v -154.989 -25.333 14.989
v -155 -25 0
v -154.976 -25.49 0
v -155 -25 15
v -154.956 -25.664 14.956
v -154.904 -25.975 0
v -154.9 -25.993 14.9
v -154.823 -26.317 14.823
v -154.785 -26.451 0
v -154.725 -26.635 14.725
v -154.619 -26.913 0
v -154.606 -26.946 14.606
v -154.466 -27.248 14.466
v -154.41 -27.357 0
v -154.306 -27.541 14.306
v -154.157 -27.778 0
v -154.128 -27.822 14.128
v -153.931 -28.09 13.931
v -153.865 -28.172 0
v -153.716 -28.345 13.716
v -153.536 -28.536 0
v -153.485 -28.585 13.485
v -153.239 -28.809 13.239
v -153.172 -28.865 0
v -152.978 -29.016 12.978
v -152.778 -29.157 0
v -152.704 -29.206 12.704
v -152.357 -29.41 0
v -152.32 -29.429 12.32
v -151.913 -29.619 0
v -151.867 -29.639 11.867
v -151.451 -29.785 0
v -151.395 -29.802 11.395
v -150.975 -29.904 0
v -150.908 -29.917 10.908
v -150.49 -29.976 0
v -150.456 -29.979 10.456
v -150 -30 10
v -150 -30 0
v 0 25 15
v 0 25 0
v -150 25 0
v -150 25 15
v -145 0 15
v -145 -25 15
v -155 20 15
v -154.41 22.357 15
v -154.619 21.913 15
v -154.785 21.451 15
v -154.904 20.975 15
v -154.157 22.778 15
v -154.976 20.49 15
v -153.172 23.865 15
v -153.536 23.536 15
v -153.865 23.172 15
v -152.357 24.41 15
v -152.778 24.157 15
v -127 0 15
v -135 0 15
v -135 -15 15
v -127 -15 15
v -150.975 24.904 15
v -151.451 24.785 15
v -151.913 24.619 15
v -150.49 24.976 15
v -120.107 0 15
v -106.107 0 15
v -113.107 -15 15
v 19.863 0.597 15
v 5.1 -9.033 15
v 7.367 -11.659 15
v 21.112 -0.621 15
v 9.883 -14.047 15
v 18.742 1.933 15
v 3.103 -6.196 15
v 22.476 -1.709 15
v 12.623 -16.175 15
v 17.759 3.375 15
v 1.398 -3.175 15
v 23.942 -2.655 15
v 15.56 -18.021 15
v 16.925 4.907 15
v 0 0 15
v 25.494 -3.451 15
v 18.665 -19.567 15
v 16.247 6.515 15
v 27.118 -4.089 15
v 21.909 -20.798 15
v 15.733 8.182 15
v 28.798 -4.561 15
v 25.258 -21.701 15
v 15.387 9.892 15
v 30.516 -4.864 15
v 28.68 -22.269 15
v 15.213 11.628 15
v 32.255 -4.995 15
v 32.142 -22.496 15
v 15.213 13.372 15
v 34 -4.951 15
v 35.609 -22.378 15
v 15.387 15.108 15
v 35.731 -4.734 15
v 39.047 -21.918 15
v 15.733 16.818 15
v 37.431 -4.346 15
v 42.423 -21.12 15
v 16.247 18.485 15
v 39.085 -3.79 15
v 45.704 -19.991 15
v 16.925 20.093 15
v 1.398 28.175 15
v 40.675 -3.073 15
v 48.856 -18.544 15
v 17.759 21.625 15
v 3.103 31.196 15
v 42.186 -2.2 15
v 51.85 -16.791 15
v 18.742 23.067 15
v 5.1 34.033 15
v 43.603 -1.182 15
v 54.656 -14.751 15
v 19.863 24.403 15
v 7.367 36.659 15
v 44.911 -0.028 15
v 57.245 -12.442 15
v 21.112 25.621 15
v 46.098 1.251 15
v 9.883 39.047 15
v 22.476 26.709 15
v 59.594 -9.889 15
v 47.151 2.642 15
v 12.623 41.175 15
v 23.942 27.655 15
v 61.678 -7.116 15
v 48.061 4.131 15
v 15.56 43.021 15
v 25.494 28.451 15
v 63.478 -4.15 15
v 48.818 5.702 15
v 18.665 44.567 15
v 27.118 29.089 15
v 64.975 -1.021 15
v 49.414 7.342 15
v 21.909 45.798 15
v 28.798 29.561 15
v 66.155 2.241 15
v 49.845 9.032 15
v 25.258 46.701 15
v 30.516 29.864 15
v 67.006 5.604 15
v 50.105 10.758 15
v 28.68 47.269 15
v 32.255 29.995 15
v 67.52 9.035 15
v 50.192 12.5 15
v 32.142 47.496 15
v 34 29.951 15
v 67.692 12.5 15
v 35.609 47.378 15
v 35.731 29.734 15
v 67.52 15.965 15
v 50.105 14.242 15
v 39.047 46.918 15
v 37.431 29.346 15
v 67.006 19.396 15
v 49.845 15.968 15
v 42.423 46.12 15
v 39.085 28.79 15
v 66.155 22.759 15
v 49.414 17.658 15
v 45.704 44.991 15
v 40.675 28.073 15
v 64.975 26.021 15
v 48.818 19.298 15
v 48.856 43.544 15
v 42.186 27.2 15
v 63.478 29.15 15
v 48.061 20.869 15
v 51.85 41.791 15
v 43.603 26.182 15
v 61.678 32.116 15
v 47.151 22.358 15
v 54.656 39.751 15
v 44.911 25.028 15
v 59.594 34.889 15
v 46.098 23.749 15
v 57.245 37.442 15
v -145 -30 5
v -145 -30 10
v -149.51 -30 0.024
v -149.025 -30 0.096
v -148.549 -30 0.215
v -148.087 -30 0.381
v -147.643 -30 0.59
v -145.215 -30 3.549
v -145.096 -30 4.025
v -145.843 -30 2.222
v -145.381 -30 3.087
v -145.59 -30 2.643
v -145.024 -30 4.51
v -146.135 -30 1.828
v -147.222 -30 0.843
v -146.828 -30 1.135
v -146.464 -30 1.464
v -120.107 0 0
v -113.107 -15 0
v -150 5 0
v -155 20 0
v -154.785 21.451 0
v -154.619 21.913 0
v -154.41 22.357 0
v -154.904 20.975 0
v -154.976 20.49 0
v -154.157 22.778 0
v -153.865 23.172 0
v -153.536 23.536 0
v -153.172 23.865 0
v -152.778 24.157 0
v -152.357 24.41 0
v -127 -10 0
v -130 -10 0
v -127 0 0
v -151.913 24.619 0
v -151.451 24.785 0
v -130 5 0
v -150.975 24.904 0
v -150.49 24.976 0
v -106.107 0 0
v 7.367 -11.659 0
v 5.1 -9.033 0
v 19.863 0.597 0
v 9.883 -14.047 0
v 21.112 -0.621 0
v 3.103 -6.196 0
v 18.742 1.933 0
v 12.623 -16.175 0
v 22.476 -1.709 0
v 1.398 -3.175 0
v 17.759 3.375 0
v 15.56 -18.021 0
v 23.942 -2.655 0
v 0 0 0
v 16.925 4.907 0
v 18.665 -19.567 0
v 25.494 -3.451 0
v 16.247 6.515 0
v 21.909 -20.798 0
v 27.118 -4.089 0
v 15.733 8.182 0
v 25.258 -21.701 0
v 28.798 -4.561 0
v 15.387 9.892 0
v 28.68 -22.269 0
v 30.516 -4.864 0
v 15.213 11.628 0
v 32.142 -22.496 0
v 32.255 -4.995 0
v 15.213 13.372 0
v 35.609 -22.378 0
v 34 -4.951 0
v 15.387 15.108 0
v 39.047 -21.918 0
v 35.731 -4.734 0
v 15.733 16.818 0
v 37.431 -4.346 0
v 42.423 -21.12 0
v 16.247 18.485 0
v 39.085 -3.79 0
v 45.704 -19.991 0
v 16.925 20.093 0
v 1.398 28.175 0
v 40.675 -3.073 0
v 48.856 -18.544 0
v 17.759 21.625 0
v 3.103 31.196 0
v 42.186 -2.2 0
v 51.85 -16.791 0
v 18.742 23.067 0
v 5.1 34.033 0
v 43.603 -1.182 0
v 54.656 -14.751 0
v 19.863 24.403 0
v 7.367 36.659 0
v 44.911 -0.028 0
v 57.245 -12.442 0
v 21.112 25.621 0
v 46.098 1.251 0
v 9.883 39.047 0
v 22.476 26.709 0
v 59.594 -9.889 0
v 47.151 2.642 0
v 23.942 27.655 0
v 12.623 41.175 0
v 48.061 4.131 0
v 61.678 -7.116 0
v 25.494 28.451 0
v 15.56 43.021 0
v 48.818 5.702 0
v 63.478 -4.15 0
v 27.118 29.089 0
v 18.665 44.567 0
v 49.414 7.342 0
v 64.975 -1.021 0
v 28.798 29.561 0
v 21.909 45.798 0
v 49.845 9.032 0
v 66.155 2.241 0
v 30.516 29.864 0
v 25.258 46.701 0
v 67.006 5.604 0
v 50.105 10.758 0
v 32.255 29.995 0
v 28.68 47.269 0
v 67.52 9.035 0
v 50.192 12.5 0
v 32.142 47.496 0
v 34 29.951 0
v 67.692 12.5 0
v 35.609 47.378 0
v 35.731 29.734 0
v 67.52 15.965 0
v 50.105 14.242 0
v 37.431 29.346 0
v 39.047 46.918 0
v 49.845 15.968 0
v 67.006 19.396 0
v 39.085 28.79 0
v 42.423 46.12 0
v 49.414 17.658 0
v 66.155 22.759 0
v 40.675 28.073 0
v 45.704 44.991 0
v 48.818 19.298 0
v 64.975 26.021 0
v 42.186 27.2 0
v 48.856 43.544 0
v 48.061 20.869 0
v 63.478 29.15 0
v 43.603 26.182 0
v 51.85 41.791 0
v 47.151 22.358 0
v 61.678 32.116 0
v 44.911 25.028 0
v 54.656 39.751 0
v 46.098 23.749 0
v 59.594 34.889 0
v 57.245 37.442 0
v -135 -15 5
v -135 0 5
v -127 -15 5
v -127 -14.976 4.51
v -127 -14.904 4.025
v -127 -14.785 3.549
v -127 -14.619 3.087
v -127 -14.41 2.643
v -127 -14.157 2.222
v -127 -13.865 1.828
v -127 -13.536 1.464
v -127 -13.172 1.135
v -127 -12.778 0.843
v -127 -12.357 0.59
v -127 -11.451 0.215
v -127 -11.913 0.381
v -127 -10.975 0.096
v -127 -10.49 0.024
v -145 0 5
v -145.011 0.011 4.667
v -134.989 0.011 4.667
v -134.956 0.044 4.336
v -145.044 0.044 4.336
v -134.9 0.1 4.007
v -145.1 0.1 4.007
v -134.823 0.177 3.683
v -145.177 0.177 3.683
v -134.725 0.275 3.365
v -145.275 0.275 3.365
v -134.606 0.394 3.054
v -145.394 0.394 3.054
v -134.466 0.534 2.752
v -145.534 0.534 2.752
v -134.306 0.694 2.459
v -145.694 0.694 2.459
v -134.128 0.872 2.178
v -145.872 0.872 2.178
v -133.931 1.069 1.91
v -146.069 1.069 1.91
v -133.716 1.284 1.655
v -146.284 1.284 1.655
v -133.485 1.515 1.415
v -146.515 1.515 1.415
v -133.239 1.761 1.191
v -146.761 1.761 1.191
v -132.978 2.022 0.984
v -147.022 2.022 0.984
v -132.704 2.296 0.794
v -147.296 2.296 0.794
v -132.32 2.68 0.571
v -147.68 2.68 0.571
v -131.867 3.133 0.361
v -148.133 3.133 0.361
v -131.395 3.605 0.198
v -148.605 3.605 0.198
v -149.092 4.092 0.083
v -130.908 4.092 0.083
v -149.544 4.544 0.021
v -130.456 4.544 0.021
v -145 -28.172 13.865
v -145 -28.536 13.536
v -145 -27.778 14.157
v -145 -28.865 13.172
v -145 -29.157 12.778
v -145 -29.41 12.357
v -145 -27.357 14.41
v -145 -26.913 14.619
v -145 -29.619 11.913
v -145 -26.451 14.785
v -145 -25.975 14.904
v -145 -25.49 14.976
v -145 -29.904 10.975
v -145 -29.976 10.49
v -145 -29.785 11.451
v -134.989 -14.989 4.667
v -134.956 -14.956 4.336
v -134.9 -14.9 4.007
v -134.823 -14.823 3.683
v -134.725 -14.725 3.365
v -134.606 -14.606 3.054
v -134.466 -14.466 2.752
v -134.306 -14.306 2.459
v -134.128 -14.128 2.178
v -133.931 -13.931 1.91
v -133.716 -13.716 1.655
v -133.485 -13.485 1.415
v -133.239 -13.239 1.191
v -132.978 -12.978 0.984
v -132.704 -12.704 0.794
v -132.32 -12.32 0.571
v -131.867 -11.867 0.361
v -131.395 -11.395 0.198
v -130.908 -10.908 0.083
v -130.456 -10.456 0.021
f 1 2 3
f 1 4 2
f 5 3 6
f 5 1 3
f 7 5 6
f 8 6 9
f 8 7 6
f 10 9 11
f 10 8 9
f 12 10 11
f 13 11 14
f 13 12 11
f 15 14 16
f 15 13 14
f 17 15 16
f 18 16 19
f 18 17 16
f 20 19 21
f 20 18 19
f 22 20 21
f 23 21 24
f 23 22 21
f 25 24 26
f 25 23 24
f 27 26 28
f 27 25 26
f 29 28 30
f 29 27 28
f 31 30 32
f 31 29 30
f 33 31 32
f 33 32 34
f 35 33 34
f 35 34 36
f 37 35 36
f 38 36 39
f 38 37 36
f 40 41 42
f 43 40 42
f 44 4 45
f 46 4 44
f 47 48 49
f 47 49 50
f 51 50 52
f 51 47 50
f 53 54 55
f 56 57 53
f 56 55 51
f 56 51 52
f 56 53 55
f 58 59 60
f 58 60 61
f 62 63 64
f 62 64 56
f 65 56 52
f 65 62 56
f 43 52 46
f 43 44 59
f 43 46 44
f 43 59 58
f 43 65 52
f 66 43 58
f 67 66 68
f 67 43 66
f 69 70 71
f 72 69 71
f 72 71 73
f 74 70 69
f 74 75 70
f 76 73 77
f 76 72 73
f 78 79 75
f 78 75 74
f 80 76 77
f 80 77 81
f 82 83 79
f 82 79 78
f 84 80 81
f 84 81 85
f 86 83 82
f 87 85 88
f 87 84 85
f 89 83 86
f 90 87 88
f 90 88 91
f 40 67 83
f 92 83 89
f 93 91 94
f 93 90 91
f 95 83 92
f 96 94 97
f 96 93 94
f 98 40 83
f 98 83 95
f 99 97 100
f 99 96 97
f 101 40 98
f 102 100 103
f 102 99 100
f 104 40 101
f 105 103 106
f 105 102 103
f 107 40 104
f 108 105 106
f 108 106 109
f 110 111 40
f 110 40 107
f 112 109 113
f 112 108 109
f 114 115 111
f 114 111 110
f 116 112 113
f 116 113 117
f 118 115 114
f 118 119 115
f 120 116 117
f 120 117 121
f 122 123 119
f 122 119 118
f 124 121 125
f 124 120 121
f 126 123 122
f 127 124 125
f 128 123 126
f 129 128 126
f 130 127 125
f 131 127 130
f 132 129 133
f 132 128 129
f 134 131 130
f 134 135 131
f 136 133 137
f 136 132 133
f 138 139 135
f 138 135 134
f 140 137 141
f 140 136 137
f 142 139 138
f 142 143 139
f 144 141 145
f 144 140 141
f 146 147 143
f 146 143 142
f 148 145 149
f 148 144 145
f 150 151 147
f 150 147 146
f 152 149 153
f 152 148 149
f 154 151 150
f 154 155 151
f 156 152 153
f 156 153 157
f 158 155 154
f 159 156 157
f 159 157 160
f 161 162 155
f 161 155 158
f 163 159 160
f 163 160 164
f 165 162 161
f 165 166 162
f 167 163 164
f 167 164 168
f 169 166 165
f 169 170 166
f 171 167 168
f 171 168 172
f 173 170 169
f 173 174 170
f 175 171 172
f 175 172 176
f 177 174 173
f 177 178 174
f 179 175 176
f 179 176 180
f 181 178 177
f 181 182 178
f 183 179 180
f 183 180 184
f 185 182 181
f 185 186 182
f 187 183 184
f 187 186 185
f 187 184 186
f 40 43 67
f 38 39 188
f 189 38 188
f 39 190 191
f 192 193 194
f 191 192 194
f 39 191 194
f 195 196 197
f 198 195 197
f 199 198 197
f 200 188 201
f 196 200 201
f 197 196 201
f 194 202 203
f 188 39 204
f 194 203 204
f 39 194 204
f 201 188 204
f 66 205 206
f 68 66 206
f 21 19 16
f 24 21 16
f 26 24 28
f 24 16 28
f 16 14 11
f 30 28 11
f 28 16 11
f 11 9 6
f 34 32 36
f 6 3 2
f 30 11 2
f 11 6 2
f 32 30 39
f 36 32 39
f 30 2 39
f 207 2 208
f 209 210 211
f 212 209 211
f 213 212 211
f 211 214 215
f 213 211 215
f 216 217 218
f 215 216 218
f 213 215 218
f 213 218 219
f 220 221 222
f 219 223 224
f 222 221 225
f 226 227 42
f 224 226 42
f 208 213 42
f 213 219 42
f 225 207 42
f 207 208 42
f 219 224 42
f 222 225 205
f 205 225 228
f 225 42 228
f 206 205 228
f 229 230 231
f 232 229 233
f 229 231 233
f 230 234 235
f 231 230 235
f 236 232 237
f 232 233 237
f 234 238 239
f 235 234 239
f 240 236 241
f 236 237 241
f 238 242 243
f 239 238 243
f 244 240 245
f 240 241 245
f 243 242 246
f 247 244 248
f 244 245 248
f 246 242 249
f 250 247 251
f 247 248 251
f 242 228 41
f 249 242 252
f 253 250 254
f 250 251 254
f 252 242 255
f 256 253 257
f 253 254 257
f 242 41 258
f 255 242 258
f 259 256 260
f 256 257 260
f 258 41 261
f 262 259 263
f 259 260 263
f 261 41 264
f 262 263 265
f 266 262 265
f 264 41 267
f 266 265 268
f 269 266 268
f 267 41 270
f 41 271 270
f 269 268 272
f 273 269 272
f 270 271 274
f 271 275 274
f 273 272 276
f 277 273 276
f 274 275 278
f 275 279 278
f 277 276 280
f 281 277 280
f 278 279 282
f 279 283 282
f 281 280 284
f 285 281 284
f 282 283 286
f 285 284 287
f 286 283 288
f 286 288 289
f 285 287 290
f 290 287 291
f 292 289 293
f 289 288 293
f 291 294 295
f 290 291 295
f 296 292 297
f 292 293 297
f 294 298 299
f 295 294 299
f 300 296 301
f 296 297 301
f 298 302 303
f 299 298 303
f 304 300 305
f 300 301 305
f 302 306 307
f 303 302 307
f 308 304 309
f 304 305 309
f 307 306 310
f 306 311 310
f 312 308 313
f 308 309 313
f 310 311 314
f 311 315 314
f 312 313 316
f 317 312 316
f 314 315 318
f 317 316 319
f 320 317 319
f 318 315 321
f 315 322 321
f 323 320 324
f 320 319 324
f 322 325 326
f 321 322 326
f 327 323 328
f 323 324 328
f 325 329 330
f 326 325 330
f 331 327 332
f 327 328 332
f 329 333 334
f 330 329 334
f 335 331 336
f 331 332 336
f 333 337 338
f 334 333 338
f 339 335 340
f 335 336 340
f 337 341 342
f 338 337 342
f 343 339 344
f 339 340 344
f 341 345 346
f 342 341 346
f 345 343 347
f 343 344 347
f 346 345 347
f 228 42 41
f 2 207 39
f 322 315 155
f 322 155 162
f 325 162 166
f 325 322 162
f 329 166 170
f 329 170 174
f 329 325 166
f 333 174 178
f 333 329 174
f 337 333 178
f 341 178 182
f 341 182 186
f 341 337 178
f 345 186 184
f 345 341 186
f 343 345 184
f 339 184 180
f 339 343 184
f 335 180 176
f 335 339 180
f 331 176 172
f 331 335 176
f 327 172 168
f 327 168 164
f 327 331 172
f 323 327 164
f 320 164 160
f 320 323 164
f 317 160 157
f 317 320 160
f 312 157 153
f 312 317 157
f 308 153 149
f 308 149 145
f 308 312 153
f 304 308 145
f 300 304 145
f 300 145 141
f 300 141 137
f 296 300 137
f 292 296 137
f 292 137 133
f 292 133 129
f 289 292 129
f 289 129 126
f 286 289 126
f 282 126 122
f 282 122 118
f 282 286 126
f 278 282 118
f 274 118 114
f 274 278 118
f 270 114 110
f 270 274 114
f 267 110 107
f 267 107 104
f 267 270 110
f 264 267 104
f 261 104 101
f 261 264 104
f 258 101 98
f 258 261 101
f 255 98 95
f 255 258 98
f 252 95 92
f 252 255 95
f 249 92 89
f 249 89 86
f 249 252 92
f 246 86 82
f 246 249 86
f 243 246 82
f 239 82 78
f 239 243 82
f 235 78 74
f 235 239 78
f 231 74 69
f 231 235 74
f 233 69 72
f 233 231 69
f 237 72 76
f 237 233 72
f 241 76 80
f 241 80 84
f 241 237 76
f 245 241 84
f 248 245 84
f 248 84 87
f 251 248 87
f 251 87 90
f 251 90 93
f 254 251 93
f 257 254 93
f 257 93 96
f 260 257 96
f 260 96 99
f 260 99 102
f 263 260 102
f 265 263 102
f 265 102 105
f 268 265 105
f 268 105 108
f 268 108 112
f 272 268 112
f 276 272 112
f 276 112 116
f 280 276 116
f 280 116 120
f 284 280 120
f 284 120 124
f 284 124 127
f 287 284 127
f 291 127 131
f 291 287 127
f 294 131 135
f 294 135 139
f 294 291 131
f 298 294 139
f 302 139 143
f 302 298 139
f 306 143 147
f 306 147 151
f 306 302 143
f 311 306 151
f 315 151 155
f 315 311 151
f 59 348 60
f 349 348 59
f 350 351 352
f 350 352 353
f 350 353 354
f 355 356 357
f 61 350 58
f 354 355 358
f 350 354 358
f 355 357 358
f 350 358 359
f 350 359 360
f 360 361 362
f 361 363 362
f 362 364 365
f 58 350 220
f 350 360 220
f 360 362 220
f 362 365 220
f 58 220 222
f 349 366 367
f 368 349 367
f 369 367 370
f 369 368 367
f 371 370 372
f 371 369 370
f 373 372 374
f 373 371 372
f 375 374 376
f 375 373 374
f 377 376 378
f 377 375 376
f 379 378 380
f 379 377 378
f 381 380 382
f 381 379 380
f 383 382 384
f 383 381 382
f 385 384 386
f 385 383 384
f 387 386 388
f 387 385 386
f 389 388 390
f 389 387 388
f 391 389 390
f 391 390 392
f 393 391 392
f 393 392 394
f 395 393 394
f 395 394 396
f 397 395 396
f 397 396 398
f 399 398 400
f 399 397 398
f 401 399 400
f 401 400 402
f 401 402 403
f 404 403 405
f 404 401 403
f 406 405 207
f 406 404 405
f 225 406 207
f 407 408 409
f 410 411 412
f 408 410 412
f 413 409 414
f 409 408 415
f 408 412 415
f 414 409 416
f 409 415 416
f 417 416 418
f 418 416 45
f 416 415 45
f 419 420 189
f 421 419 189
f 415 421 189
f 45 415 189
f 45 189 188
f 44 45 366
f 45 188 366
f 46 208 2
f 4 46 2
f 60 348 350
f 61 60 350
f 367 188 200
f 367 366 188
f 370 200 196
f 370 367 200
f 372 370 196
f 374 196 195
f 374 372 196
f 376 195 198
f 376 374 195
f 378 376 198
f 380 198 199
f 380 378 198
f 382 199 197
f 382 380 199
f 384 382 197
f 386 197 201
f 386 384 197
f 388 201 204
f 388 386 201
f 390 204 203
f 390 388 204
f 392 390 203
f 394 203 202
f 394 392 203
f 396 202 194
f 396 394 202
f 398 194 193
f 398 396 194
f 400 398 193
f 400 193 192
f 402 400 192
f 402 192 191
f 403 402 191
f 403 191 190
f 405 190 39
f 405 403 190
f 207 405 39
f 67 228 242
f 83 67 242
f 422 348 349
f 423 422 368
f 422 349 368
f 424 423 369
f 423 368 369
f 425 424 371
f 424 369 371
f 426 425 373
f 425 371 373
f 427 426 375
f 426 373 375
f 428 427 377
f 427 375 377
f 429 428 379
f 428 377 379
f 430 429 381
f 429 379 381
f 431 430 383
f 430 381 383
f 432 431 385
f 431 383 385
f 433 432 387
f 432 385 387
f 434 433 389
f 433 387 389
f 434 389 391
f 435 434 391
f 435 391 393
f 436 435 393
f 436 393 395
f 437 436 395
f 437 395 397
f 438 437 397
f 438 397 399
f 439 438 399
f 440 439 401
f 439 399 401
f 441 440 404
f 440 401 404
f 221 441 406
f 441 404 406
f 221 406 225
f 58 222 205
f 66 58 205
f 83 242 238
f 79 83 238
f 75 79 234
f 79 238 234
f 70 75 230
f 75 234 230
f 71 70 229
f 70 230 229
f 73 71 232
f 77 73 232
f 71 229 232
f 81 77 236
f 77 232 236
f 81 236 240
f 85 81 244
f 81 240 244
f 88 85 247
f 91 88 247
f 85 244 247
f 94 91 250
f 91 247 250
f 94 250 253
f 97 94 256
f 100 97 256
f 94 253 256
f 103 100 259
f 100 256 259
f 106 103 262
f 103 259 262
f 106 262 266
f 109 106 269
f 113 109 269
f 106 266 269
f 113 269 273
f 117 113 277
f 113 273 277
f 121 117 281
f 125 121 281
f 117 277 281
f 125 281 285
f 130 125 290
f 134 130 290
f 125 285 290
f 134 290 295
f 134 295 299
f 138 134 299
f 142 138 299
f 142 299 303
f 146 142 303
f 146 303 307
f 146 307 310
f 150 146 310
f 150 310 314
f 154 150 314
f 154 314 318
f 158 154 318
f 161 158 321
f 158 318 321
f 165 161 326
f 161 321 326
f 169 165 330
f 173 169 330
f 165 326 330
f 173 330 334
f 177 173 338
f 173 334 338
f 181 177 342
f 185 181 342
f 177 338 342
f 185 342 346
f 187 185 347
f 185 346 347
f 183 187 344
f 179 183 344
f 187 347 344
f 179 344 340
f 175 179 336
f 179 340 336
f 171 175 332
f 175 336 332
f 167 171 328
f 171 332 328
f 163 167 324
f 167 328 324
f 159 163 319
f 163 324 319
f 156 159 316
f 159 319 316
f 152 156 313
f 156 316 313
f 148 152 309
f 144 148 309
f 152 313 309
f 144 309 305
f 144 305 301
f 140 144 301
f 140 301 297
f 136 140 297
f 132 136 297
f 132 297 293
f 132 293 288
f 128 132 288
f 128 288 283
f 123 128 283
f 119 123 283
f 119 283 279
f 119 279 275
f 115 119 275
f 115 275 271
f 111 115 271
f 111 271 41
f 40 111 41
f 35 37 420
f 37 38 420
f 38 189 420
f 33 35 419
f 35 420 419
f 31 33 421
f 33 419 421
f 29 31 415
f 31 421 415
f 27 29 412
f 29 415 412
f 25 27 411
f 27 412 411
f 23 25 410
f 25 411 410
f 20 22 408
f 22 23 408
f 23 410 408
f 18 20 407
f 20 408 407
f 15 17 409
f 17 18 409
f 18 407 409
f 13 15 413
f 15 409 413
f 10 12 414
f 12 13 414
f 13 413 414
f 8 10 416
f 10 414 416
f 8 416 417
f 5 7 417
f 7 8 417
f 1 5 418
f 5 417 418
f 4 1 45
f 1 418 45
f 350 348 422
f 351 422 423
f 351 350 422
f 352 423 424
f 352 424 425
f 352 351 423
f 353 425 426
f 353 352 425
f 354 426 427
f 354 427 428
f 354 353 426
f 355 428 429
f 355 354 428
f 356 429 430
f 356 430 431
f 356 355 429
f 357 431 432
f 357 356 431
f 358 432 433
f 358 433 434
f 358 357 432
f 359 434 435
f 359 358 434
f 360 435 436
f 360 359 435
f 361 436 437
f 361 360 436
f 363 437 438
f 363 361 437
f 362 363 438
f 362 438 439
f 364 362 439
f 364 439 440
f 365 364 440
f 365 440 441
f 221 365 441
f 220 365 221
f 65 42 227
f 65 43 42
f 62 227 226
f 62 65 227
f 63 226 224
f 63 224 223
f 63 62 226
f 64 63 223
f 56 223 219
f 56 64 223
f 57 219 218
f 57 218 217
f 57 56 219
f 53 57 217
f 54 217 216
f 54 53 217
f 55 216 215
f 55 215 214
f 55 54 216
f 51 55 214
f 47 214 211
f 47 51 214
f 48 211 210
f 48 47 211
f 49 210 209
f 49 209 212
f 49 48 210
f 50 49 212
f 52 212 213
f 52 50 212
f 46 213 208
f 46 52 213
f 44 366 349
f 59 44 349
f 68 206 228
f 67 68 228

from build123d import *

# Parameters (mm, degrees)
F0_R     = 17.5
F0_W     = 10
F0_H     = 30
F0_W_2   = 8
F0_H_2   = 15
F1_DEPTH = 15
F2_R     = 4.99999


# Not quite as in the source:
# - a fillet or chamfer is up to 0.001 mm smaller than in the source, because OpenCascade refuses the exact size


with BuildPart() as f1:
    # F0 (on Top) → F1 (new body)
    with BuildSketch(Plane.XY):
        Polygon((-106.1073173197, 0), (0, 0), (0, 25), (-155, 25), (-155, 0), (-145, 0), (-135, 0), (-127, 0), (-120.1073173197, 0), align=None)
        with BuildLine():
            Line((0, 25), (0, 0))
            ThreePointArc((0, 0), (67.6917420766, 12.5), (0, 25))
        make_face()
        with Locations((32.6917420766, 12.5)):
            Circle(F0_R, mode=Mode.SUBTRACT)
        Polygon((-113.1073173197, -15), (-106.1073173197, 0), (-120.1073173197, 0), align=None)
        with Locations((-150, -15)):
            Rectangle(F0_W, F0_H)
        with Locations((-131, -7.5)):
            Rectangle(F0_W_2, F0_H_2)
    extrude(amount=F1_DEPTH)

    # F2 (radius 5 in the source; OpenCascade refuses exactly that, so slightly less here)
    f2_edges = [f1.edges().sort_by_distance(p)[0] for p in [
        (-155, 25, 7.5),
        (-155, -30, 7.5),
        (-150, -30, 15),
        (-145, -15, 0),
        (-140, 0, 0),
        (-135, -7.5, 0),
        (-131, -15, 0),
    ]]
    fillet(f2_edges, radius=F2_R)


solid = f1.part
